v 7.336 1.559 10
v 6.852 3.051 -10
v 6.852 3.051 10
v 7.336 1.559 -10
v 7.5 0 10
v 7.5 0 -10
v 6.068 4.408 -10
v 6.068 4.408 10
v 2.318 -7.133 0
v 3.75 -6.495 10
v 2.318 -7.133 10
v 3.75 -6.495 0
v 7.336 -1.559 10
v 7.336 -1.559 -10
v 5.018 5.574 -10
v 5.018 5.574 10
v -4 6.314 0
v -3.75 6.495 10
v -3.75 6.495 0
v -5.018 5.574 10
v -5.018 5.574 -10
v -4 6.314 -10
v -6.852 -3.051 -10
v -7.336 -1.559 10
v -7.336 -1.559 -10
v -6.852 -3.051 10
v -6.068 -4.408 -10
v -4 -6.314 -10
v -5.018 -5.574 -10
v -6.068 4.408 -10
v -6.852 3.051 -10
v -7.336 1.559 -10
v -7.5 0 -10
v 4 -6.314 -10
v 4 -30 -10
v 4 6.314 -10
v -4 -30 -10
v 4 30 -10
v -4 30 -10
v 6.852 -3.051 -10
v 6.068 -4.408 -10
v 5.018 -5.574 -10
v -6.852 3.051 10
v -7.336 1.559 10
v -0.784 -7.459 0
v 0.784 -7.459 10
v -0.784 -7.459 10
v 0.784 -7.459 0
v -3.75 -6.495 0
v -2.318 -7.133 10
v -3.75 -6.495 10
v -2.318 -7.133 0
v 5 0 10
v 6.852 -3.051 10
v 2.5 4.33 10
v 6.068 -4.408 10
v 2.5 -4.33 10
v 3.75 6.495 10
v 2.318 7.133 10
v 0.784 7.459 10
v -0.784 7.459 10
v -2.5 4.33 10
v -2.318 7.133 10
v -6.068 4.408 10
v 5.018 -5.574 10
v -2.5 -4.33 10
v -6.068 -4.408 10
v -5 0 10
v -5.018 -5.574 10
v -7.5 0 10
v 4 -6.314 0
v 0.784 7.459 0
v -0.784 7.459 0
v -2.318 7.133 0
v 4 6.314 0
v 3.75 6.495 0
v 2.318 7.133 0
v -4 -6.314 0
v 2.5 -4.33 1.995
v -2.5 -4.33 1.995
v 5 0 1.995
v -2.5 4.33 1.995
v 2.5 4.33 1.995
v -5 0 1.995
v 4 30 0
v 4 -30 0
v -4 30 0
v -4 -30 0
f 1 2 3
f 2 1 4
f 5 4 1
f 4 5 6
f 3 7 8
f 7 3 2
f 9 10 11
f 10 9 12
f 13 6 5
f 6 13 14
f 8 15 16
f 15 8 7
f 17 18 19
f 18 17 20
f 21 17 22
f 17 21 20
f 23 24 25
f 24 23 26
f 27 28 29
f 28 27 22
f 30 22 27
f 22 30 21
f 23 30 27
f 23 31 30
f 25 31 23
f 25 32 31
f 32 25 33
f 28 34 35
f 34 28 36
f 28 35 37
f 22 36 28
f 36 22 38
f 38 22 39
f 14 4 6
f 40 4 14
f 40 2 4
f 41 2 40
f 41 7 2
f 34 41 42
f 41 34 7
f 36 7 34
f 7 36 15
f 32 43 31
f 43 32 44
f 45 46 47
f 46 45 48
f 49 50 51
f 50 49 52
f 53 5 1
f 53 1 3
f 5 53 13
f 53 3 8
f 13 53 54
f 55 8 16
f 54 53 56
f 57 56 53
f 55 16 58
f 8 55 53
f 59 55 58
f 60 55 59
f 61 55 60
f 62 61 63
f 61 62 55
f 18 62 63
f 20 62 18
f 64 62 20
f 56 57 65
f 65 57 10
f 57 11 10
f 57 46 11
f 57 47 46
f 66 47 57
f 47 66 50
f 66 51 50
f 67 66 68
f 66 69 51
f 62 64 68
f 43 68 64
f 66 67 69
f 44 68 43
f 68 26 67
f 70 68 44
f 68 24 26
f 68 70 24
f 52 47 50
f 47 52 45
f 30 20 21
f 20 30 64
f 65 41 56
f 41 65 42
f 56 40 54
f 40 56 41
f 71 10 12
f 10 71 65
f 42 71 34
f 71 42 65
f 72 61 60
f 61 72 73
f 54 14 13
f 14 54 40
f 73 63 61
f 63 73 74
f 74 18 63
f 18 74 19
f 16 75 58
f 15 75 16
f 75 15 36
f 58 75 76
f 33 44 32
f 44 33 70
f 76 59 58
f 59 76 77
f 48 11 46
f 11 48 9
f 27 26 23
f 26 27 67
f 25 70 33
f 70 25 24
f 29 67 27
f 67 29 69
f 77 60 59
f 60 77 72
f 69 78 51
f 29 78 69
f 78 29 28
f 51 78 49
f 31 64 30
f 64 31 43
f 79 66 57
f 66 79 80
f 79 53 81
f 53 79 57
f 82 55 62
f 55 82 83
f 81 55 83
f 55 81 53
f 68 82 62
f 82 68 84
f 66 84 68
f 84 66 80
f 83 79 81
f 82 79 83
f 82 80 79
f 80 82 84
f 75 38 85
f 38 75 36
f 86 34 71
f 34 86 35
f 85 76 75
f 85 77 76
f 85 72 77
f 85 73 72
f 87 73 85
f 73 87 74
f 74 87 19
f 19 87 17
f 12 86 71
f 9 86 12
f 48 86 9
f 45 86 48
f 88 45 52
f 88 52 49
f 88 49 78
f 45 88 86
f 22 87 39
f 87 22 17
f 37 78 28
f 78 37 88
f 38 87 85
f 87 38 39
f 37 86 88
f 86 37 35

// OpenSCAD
$fn = 30;

// M5 Nut Wrench
wrench_h = 20.0;
lever_w = 10.0;
nut_w = 10.0;
nut_h = 8;

difference() {
  cylinder(h=wrench_h, r=(nut_w * 1.5) / 2.0, center=true);

  translate([0.0, 0.0, wrench_h / 2.0 - nut_h / 2.0])
    cylinder(h=nut_h + 0.01, r=nut_w / 2.0, $fn=6, center=true);
}

translate([0.0, 0.0, - wrench_h / 2.0 + lever_w / 2.0])
  cube([nut_w * 0.8, nut_w * 6.0, lever_w], center=true);
